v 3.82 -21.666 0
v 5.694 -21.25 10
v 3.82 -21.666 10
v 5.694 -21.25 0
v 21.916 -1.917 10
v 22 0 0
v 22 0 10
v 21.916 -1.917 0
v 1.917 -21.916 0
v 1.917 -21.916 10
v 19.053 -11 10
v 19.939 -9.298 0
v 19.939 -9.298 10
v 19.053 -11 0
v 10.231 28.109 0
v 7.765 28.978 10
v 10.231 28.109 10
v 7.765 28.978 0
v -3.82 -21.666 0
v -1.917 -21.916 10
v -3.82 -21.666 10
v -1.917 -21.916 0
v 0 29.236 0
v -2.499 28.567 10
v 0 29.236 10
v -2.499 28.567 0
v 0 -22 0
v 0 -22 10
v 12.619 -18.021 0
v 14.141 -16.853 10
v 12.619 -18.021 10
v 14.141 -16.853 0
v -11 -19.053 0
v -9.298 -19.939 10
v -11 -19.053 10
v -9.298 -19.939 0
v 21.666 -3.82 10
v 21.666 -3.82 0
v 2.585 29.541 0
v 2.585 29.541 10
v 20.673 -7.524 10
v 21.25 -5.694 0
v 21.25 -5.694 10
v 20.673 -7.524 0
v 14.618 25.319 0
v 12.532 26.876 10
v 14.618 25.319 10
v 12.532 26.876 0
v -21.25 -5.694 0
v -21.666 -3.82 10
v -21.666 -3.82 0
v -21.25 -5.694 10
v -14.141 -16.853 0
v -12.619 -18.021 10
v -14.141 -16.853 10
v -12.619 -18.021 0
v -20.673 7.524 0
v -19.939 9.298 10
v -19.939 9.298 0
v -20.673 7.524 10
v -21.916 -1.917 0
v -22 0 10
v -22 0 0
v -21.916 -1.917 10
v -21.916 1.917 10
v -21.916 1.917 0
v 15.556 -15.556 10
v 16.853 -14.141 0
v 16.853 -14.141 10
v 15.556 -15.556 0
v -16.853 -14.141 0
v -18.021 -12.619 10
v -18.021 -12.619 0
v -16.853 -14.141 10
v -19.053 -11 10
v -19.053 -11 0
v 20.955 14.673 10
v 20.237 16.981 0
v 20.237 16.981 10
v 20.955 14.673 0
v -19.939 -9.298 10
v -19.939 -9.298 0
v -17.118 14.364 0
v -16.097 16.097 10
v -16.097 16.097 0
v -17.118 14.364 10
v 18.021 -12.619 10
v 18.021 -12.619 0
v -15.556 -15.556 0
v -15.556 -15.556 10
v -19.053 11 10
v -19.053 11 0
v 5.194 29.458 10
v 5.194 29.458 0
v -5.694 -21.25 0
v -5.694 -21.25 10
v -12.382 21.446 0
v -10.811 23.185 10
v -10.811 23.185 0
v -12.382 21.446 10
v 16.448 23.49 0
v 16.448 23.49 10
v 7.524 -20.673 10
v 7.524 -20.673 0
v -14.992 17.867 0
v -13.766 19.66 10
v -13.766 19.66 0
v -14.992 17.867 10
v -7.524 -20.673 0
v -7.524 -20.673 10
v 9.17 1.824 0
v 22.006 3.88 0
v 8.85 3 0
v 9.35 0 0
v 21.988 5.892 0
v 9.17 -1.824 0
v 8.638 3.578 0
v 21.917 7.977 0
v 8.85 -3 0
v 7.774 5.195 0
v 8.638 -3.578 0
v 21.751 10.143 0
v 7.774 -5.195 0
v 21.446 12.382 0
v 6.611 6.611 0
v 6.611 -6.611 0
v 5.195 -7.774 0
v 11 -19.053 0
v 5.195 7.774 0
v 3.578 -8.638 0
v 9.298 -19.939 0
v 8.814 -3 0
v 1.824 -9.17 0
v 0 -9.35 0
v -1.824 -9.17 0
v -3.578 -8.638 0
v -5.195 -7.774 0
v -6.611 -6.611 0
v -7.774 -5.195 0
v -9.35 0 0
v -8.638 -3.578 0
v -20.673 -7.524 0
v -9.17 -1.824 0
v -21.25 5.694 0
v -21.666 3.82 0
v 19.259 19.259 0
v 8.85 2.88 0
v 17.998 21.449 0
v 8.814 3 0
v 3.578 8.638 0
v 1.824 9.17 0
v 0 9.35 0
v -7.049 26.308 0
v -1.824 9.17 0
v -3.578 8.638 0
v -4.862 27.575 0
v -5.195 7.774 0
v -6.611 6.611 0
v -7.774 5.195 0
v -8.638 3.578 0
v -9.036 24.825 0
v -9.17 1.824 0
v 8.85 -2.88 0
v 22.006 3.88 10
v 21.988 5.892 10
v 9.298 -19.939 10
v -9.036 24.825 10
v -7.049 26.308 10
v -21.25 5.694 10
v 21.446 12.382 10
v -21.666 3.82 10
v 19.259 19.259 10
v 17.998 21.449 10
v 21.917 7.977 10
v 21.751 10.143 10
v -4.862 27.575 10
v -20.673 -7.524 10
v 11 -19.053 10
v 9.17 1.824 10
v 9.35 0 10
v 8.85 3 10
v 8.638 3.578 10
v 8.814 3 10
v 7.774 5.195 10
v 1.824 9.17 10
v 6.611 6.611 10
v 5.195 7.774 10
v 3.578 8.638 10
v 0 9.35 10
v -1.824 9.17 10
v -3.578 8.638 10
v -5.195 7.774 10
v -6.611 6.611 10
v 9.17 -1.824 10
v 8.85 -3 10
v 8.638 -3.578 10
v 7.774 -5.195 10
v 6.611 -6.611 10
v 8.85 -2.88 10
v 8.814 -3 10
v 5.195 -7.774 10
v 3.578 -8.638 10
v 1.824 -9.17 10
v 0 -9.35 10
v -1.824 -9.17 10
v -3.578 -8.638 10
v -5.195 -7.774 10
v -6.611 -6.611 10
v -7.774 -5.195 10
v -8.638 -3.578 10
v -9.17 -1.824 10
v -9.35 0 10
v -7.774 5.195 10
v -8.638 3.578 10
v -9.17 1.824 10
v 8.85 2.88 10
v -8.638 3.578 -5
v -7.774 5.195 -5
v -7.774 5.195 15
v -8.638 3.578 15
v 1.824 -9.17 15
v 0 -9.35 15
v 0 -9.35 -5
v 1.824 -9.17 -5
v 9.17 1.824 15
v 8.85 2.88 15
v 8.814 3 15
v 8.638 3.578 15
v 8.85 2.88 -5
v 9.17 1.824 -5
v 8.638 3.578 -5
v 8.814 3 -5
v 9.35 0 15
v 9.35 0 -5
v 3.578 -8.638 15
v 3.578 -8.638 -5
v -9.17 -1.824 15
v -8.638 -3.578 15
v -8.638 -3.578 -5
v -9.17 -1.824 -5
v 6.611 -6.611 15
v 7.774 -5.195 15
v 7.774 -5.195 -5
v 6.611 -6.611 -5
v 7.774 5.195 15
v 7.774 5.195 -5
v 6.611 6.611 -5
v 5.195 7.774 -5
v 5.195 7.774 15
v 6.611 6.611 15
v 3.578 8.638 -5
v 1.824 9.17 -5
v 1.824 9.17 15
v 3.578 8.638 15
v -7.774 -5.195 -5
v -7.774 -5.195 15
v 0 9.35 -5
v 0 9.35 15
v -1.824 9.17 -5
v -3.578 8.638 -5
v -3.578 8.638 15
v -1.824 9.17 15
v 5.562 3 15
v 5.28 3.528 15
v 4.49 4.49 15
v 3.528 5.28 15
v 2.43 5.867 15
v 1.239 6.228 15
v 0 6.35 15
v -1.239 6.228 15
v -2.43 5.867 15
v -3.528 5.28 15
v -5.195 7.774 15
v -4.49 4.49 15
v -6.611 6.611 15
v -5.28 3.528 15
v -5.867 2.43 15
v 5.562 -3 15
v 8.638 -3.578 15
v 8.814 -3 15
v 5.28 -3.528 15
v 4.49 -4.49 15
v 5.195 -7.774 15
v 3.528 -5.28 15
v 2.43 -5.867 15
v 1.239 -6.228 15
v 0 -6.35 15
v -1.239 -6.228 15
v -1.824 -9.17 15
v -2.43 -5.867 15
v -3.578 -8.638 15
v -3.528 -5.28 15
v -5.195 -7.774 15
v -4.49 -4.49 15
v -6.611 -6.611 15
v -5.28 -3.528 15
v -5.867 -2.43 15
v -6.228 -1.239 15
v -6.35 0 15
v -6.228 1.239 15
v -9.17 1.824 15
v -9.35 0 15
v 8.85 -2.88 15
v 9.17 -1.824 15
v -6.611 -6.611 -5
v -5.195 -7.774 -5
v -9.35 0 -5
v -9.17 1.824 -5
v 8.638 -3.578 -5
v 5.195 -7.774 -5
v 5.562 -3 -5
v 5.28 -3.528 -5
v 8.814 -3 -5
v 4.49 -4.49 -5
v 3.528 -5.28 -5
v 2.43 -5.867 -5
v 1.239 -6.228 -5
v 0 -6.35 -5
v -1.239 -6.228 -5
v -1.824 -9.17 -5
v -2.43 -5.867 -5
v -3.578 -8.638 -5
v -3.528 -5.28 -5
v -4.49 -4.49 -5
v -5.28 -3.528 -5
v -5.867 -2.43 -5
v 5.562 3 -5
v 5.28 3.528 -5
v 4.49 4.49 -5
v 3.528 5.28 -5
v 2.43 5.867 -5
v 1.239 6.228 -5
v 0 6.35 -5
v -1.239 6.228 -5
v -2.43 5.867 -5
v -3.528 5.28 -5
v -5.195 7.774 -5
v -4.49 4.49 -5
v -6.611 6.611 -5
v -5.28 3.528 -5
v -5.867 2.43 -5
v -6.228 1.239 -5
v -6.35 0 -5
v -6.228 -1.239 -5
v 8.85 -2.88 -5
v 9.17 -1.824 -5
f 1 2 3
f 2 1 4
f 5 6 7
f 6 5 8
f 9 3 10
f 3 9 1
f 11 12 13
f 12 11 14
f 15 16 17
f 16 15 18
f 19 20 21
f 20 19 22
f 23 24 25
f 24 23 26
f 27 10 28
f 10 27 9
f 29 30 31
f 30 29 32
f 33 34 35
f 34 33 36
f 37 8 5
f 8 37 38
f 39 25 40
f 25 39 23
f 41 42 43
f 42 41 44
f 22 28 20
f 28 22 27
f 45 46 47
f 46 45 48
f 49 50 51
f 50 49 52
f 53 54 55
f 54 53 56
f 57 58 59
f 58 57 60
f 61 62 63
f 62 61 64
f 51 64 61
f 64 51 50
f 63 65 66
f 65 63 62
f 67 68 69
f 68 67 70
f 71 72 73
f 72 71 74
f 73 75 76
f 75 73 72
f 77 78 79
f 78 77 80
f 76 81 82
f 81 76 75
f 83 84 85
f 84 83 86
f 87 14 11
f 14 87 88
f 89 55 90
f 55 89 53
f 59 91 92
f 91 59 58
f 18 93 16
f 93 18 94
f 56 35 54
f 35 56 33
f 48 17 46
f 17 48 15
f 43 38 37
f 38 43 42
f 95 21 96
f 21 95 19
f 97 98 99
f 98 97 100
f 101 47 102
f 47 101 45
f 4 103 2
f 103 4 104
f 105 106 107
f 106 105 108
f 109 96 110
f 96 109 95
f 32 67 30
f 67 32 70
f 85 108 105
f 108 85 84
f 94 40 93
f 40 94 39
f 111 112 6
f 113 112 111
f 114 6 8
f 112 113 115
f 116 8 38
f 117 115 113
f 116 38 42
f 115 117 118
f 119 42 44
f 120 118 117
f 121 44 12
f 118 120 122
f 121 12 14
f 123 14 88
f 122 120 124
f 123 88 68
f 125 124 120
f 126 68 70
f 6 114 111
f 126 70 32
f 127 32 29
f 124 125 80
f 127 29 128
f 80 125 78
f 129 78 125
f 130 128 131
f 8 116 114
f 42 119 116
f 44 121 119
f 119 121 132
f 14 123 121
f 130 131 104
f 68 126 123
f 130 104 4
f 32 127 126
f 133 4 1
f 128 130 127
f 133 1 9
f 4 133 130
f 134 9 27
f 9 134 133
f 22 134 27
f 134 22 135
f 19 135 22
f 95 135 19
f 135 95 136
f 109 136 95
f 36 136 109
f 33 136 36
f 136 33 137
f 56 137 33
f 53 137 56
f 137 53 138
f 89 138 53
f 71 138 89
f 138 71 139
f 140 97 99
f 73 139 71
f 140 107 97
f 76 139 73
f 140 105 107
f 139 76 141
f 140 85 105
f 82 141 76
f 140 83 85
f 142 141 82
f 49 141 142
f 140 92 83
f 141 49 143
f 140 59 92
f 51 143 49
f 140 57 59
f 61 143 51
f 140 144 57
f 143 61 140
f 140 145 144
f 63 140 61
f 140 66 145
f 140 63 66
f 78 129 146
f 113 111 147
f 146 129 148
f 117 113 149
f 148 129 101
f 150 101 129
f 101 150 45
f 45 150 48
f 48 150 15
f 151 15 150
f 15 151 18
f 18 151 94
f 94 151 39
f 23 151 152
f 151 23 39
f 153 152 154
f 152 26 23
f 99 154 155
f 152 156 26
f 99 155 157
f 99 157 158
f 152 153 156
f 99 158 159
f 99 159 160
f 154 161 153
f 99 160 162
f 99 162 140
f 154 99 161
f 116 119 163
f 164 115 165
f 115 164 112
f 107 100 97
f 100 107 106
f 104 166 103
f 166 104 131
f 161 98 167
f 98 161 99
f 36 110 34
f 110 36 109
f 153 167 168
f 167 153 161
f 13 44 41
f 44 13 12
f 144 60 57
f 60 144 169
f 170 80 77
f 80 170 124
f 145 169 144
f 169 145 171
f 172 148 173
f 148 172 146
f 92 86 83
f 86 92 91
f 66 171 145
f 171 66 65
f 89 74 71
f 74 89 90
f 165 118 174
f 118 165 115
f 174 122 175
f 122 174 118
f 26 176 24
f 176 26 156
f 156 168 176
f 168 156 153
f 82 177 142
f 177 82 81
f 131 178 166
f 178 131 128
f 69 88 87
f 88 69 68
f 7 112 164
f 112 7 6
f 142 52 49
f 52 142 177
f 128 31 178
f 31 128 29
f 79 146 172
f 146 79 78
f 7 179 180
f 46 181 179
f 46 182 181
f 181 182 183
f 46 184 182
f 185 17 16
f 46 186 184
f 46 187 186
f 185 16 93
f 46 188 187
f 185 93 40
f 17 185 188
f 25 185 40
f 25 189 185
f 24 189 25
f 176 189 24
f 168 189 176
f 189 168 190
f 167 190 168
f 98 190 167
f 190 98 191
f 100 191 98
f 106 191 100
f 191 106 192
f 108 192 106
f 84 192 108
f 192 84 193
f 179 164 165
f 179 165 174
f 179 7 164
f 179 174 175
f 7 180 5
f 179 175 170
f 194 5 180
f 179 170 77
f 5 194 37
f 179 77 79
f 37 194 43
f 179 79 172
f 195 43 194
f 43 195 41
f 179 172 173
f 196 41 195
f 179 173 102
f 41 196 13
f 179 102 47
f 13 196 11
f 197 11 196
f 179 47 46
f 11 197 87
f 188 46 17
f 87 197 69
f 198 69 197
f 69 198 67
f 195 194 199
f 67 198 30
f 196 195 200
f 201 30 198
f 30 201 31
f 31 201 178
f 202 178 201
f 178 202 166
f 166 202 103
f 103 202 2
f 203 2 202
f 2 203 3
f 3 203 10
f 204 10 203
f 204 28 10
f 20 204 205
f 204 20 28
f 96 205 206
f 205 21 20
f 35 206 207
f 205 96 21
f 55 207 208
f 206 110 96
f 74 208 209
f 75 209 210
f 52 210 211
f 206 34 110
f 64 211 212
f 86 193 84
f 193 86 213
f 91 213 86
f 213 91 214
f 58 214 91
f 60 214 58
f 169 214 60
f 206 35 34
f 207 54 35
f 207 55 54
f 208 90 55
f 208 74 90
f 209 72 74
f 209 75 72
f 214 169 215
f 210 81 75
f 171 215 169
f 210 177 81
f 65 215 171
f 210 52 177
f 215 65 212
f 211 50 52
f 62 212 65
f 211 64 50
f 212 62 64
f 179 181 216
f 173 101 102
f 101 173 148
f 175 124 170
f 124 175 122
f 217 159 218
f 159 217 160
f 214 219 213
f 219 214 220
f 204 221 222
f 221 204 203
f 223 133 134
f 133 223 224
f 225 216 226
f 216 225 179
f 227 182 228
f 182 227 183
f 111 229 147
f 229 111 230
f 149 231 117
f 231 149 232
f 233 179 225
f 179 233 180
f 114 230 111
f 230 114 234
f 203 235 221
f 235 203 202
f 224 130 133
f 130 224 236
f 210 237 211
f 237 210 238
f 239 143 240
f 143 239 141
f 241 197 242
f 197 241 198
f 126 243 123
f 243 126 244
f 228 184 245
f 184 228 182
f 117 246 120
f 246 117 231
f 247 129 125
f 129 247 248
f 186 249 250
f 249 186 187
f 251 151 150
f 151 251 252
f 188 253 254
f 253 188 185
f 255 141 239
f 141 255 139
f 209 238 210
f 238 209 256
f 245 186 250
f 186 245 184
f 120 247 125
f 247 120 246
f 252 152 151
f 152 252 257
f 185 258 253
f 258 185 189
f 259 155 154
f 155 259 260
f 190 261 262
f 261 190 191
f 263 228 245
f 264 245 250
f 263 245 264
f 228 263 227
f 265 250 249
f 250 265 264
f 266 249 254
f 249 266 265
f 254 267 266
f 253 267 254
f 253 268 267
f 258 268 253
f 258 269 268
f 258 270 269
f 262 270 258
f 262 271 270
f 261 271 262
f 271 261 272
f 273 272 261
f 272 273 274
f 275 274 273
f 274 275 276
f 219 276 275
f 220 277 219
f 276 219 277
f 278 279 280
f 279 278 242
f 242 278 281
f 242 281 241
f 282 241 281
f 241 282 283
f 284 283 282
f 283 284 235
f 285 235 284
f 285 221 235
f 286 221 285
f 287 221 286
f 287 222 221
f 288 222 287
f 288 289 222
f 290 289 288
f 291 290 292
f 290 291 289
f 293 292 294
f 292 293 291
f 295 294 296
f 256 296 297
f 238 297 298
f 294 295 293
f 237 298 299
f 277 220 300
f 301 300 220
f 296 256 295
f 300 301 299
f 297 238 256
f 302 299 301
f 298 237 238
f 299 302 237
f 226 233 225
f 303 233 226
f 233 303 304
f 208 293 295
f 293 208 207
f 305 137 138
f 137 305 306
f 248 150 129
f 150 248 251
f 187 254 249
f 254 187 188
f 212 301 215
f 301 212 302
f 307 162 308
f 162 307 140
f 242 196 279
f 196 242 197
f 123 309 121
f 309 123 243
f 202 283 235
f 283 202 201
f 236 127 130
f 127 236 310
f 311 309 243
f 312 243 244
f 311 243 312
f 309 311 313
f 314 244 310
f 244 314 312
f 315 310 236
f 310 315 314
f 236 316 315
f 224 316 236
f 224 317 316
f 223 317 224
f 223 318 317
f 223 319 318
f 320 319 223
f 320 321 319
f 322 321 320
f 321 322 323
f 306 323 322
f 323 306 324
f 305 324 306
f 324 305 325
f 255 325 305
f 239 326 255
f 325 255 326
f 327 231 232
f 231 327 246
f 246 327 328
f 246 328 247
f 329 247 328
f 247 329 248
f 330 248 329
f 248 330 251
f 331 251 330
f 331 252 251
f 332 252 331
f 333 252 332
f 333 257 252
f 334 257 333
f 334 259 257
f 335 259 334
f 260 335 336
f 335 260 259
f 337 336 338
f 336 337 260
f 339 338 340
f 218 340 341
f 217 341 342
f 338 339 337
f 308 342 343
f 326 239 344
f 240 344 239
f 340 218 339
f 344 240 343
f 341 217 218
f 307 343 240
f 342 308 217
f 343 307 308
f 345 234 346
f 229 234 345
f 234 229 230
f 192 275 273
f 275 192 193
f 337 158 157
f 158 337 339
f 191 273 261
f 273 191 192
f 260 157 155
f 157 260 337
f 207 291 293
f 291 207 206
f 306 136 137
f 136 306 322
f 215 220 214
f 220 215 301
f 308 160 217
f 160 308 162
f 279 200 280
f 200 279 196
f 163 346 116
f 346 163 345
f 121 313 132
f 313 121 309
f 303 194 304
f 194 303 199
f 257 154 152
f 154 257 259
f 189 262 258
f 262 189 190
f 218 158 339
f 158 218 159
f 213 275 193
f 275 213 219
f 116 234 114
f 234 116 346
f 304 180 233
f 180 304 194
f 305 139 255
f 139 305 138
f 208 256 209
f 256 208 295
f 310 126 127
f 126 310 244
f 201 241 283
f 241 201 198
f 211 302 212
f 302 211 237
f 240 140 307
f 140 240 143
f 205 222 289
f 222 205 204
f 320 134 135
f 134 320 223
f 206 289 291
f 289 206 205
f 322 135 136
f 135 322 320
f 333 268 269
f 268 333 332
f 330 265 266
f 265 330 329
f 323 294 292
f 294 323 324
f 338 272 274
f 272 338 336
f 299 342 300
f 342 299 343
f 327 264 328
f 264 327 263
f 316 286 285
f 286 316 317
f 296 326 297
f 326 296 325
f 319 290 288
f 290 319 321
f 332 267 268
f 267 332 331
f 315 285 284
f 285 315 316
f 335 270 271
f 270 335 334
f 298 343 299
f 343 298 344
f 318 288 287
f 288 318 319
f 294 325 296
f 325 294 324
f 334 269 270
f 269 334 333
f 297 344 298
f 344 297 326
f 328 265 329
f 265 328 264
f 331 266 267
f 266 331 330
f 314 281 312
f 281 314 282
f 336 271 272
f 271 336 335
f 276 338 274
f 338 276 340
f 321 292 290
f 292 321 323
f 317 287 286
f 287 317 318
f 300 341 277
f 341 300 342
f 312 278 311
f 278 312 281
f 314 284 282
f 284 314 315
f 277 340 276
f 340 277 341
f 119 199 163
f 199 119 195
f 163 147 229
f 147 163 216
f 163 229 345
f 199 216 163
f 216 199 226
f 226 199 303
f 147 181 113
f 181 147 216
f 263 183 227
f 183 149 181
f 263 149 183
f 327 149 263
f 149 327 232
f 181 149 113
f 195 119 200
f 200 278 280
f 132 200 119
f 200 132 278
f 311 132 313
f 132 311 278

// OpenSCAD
$fn = 32;

// ----------------------------------------------------------------------
// Cam: base radius 22 mm with a 8 mm lift over 150 degrees
// ----------------------------------------------------------------------

// --- parameters (mm) ---
base_r = 22;              // base radius
lift = 8;                 // lift height above the base radius
lift_span = 150;          // angular width of the lift
lift_start = 0;           // angle where the lift starts
cam_t = 10;               // cam plate thickness
hub_d = 18.7;             // hub diameter
hub_h = 20;               // hub height
bore_d = 12.7;            // bore
key_w = 6;                // keyway width
key_depth = 1.6;          // keyway depth

cam_profile = [[22, 0], [22.003, 1.925], [22.006, 3.88], [21.988, 5.892], [21.917, 7.977], [21.751, 10.143], [21.446, 12.382], [20.955, 14.673], [20.237, 16.981], [19.259, 19.259], [17.998, 21.449], [16.448, 23.49], [14.618, 25.319], [12.532, 26.876], [10.231, 28.109], [7.765, 28.978], [5.194, 29.458], [2.585, 29.541], [0, 29.236], [-2.499, 28.567], [-4.862, 27.575], [-7.049, 26.308], [-9.036, 24.825], [-10.811, 23.185], [-12.382, 21.446], [-13.766, 19.66], [-14.992, 17.867], [-16.097, 16.097], [-17.118, 14.364], [-18.093, 12.669], [-19.053, 11], [-19.939, 9.298], [-20.673, 7.524], [-21.25, 5.694], [-21.666, 3.82], [-21.916, 1.917], [-22, 0], [-21.916, -1.917], [-21.666, -3.82], [-21.25, -5.694], [-20.673, -7.524], [-19.939, -9.298], [-19.053, -11], [-18.021, -12.619], [-16.853, -14.141], [-15.556, -15.556], [-14.141, -16.853], [-12.619, -18.021], [-11, -19.053], [-9.298, -19.939], [-7.524, -20.673], [-5.694, -21.25], [-3.82, -21.666], [-1.917, -21.916], [0, -22], [1.917, -21.916], [3.82, -21.666], [5.694, -21.25], [7.524, -20.673], [9.298, -19.939], [11, -19.053], [12.619, -18.021], [14.141, -16.853], [15.556, -15.556], [16.853, -14.141], [18.021, -12.619], [19.053, -11], [19.939, -9.298], [20.673, -7.524], [21.25, -5.694], [21.666, -3.82], [21.916, -1.917]];

difference() {
  union() {
    linear_extrude(height = cam_t) polygon(cam_profile);
    /* hub, proud of the cam plate on both sides */
    translate([0, 0, -5]) cylinder(h = hub_h, d = hub_d);
  }
  /* bore through the hub, 2.5 mm clear on both faces */
  translate([0, 0, -7.5]) cylinder(h = hub_h + 5, d = bore_d);
  /* keyway, milled through the whole hub */
  translate([4.75, -3, -7.5]) cube([4.1, 6, 25]);
}
